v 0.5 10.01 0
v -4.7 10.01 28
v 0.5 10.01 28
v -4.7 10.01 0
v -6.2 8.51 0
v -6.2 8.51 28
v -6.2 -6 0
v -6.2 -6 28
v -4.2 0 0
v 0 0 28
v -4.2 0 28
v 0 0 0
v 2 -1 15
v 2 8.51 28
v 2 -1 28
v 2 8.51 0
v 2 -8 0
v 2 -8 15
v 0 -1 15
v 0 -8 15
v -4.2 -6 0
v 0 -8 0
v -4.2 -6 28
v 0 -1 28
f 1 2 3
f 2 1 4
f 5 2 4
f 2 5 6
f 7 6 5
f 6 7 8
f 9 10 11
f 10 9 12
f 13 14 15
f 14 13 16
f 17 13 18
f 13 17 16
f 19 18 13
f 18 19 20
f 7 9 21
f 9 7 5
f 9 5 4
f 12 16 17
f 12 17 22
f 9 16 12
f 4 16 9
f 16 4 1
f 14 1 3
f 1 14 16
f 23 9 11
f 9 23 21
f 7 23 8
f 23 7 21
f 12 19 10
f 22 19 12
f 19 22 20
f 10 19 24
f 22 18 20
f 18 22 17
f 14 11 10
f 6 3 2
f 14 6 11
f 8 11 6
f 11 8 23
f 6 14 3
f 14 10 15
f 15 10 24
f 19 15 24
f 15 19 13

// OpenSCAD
// Dock bumper: a clip-on cap for the front edge of each cliff-mount shelf,
// so Grover creeps into the dock until both caps touch the base's back wall
// and the pad bars then sit on the rollers' contact spot (Enoch's idea,
// 2026-10-26). The shelves' front faces are Grover's frontmost points and
// stand 10 mm short of the wall when it charges (Enoch, measured both sides),
// so the cap's face sits `stop` = 10 mm ahead of the shelf. Two caps also
// square Grover against the wall.
//
// It grips the shelf spine of cliff-mount.scad v4 (x 0..plate_w, front edge
// at shelf_y1 = 52.5, 4 mm thick): a jaw over the top (short enough to clear
// the PCB screw head at y 42.5) and a jaw under the bottom - deep only at the
// inboard end, shallow where the sensor PCB sits under the shelf (x >= 17.5,
// its front edge 3 mm behind the shelf's). Handed like the mounts:
// `side = "right"` / `"left"` mirrors.
//
// Frame: as cliff-mount.scad - X along the beam (outboard +X on the right
// part), +Y forward; origin at the shelf's front-bottom inboard corner.
//
// Render:  openscad -D side=\"right\" -o dock-bumper-right.stl dock-bumper.scad
// Print:   profile flat on the bed (print_orient), no supports, no brim.

side = "right";

stop     = 10;     // face ahead of the shelf front (Enoch, 10-26)
shelf_h  = 4.0;    // shelf_t + 1 in cliff-mount.scad
grip     = 0.1;    // per side: snug press fit in PETG
width    = 28;     // the shelf spine (plate_w)
jaw_t    = 2;
top_jaw  = 6;      // clears the M3 screw head (shelf front 52.5, screw at 42.5)
low_deep = 8;      // under the inboard end, x < pcb_free
low_flat = 1.0;    // under the PCB end: the PCB ribs end 1.2 mm behind the shelf front
pcb_free = 15;     // the PCB starts at x 17.5
chamfer  = 1.5;

gap = shelf_h + 2 * grip;

module profile_block(x0, x1, low) {
  translate([x0, 0, 0]) {
    // bumper block ahead of the shelf face, full height of jaws + gap
    hull() {
      translate([0, 0, -jaw_t]) cube([x1 - x0, 0.01, gap + 2 * jaw_t]);
      translate([0, stop - chamfer, -jaw_t]) cube([x1 - x0, 0.01, gap + 2 * jaw_t]);
      translate([0, stop, -jaw_t + chamfer]) cube([x1 - x0, 0.01, gap + 2 * jaw_t - 2 * chamfer]);
    }
    // top jaw, reaching back over the shelf
    translate([0, -top_jaw, gap]) cube([x1 - x0, top_jaw + 0.01, jaw_t]);
    // bottom jaw
    translate([0, -low, -jaw_t]) cube([x1 - x0, low + 0.01, jaw_t]);
  }
}

module part() {
  profile_block(0, pcb_free, low_deep);
  profile_block(pcb_free, width, low_flat);
}

print_orient = true;
module oriented() { if (side == "left") mirror([1, 0, 0]) part(); else part(); }
// stand it on its inboard (x = 0) end: the profile lies flat on the bed
if (print_orient) { if (side == "left") rotate([0, 90, 0]) oriented(); else rotate([0, -90, 0]) oriented(); }
else oriented();
